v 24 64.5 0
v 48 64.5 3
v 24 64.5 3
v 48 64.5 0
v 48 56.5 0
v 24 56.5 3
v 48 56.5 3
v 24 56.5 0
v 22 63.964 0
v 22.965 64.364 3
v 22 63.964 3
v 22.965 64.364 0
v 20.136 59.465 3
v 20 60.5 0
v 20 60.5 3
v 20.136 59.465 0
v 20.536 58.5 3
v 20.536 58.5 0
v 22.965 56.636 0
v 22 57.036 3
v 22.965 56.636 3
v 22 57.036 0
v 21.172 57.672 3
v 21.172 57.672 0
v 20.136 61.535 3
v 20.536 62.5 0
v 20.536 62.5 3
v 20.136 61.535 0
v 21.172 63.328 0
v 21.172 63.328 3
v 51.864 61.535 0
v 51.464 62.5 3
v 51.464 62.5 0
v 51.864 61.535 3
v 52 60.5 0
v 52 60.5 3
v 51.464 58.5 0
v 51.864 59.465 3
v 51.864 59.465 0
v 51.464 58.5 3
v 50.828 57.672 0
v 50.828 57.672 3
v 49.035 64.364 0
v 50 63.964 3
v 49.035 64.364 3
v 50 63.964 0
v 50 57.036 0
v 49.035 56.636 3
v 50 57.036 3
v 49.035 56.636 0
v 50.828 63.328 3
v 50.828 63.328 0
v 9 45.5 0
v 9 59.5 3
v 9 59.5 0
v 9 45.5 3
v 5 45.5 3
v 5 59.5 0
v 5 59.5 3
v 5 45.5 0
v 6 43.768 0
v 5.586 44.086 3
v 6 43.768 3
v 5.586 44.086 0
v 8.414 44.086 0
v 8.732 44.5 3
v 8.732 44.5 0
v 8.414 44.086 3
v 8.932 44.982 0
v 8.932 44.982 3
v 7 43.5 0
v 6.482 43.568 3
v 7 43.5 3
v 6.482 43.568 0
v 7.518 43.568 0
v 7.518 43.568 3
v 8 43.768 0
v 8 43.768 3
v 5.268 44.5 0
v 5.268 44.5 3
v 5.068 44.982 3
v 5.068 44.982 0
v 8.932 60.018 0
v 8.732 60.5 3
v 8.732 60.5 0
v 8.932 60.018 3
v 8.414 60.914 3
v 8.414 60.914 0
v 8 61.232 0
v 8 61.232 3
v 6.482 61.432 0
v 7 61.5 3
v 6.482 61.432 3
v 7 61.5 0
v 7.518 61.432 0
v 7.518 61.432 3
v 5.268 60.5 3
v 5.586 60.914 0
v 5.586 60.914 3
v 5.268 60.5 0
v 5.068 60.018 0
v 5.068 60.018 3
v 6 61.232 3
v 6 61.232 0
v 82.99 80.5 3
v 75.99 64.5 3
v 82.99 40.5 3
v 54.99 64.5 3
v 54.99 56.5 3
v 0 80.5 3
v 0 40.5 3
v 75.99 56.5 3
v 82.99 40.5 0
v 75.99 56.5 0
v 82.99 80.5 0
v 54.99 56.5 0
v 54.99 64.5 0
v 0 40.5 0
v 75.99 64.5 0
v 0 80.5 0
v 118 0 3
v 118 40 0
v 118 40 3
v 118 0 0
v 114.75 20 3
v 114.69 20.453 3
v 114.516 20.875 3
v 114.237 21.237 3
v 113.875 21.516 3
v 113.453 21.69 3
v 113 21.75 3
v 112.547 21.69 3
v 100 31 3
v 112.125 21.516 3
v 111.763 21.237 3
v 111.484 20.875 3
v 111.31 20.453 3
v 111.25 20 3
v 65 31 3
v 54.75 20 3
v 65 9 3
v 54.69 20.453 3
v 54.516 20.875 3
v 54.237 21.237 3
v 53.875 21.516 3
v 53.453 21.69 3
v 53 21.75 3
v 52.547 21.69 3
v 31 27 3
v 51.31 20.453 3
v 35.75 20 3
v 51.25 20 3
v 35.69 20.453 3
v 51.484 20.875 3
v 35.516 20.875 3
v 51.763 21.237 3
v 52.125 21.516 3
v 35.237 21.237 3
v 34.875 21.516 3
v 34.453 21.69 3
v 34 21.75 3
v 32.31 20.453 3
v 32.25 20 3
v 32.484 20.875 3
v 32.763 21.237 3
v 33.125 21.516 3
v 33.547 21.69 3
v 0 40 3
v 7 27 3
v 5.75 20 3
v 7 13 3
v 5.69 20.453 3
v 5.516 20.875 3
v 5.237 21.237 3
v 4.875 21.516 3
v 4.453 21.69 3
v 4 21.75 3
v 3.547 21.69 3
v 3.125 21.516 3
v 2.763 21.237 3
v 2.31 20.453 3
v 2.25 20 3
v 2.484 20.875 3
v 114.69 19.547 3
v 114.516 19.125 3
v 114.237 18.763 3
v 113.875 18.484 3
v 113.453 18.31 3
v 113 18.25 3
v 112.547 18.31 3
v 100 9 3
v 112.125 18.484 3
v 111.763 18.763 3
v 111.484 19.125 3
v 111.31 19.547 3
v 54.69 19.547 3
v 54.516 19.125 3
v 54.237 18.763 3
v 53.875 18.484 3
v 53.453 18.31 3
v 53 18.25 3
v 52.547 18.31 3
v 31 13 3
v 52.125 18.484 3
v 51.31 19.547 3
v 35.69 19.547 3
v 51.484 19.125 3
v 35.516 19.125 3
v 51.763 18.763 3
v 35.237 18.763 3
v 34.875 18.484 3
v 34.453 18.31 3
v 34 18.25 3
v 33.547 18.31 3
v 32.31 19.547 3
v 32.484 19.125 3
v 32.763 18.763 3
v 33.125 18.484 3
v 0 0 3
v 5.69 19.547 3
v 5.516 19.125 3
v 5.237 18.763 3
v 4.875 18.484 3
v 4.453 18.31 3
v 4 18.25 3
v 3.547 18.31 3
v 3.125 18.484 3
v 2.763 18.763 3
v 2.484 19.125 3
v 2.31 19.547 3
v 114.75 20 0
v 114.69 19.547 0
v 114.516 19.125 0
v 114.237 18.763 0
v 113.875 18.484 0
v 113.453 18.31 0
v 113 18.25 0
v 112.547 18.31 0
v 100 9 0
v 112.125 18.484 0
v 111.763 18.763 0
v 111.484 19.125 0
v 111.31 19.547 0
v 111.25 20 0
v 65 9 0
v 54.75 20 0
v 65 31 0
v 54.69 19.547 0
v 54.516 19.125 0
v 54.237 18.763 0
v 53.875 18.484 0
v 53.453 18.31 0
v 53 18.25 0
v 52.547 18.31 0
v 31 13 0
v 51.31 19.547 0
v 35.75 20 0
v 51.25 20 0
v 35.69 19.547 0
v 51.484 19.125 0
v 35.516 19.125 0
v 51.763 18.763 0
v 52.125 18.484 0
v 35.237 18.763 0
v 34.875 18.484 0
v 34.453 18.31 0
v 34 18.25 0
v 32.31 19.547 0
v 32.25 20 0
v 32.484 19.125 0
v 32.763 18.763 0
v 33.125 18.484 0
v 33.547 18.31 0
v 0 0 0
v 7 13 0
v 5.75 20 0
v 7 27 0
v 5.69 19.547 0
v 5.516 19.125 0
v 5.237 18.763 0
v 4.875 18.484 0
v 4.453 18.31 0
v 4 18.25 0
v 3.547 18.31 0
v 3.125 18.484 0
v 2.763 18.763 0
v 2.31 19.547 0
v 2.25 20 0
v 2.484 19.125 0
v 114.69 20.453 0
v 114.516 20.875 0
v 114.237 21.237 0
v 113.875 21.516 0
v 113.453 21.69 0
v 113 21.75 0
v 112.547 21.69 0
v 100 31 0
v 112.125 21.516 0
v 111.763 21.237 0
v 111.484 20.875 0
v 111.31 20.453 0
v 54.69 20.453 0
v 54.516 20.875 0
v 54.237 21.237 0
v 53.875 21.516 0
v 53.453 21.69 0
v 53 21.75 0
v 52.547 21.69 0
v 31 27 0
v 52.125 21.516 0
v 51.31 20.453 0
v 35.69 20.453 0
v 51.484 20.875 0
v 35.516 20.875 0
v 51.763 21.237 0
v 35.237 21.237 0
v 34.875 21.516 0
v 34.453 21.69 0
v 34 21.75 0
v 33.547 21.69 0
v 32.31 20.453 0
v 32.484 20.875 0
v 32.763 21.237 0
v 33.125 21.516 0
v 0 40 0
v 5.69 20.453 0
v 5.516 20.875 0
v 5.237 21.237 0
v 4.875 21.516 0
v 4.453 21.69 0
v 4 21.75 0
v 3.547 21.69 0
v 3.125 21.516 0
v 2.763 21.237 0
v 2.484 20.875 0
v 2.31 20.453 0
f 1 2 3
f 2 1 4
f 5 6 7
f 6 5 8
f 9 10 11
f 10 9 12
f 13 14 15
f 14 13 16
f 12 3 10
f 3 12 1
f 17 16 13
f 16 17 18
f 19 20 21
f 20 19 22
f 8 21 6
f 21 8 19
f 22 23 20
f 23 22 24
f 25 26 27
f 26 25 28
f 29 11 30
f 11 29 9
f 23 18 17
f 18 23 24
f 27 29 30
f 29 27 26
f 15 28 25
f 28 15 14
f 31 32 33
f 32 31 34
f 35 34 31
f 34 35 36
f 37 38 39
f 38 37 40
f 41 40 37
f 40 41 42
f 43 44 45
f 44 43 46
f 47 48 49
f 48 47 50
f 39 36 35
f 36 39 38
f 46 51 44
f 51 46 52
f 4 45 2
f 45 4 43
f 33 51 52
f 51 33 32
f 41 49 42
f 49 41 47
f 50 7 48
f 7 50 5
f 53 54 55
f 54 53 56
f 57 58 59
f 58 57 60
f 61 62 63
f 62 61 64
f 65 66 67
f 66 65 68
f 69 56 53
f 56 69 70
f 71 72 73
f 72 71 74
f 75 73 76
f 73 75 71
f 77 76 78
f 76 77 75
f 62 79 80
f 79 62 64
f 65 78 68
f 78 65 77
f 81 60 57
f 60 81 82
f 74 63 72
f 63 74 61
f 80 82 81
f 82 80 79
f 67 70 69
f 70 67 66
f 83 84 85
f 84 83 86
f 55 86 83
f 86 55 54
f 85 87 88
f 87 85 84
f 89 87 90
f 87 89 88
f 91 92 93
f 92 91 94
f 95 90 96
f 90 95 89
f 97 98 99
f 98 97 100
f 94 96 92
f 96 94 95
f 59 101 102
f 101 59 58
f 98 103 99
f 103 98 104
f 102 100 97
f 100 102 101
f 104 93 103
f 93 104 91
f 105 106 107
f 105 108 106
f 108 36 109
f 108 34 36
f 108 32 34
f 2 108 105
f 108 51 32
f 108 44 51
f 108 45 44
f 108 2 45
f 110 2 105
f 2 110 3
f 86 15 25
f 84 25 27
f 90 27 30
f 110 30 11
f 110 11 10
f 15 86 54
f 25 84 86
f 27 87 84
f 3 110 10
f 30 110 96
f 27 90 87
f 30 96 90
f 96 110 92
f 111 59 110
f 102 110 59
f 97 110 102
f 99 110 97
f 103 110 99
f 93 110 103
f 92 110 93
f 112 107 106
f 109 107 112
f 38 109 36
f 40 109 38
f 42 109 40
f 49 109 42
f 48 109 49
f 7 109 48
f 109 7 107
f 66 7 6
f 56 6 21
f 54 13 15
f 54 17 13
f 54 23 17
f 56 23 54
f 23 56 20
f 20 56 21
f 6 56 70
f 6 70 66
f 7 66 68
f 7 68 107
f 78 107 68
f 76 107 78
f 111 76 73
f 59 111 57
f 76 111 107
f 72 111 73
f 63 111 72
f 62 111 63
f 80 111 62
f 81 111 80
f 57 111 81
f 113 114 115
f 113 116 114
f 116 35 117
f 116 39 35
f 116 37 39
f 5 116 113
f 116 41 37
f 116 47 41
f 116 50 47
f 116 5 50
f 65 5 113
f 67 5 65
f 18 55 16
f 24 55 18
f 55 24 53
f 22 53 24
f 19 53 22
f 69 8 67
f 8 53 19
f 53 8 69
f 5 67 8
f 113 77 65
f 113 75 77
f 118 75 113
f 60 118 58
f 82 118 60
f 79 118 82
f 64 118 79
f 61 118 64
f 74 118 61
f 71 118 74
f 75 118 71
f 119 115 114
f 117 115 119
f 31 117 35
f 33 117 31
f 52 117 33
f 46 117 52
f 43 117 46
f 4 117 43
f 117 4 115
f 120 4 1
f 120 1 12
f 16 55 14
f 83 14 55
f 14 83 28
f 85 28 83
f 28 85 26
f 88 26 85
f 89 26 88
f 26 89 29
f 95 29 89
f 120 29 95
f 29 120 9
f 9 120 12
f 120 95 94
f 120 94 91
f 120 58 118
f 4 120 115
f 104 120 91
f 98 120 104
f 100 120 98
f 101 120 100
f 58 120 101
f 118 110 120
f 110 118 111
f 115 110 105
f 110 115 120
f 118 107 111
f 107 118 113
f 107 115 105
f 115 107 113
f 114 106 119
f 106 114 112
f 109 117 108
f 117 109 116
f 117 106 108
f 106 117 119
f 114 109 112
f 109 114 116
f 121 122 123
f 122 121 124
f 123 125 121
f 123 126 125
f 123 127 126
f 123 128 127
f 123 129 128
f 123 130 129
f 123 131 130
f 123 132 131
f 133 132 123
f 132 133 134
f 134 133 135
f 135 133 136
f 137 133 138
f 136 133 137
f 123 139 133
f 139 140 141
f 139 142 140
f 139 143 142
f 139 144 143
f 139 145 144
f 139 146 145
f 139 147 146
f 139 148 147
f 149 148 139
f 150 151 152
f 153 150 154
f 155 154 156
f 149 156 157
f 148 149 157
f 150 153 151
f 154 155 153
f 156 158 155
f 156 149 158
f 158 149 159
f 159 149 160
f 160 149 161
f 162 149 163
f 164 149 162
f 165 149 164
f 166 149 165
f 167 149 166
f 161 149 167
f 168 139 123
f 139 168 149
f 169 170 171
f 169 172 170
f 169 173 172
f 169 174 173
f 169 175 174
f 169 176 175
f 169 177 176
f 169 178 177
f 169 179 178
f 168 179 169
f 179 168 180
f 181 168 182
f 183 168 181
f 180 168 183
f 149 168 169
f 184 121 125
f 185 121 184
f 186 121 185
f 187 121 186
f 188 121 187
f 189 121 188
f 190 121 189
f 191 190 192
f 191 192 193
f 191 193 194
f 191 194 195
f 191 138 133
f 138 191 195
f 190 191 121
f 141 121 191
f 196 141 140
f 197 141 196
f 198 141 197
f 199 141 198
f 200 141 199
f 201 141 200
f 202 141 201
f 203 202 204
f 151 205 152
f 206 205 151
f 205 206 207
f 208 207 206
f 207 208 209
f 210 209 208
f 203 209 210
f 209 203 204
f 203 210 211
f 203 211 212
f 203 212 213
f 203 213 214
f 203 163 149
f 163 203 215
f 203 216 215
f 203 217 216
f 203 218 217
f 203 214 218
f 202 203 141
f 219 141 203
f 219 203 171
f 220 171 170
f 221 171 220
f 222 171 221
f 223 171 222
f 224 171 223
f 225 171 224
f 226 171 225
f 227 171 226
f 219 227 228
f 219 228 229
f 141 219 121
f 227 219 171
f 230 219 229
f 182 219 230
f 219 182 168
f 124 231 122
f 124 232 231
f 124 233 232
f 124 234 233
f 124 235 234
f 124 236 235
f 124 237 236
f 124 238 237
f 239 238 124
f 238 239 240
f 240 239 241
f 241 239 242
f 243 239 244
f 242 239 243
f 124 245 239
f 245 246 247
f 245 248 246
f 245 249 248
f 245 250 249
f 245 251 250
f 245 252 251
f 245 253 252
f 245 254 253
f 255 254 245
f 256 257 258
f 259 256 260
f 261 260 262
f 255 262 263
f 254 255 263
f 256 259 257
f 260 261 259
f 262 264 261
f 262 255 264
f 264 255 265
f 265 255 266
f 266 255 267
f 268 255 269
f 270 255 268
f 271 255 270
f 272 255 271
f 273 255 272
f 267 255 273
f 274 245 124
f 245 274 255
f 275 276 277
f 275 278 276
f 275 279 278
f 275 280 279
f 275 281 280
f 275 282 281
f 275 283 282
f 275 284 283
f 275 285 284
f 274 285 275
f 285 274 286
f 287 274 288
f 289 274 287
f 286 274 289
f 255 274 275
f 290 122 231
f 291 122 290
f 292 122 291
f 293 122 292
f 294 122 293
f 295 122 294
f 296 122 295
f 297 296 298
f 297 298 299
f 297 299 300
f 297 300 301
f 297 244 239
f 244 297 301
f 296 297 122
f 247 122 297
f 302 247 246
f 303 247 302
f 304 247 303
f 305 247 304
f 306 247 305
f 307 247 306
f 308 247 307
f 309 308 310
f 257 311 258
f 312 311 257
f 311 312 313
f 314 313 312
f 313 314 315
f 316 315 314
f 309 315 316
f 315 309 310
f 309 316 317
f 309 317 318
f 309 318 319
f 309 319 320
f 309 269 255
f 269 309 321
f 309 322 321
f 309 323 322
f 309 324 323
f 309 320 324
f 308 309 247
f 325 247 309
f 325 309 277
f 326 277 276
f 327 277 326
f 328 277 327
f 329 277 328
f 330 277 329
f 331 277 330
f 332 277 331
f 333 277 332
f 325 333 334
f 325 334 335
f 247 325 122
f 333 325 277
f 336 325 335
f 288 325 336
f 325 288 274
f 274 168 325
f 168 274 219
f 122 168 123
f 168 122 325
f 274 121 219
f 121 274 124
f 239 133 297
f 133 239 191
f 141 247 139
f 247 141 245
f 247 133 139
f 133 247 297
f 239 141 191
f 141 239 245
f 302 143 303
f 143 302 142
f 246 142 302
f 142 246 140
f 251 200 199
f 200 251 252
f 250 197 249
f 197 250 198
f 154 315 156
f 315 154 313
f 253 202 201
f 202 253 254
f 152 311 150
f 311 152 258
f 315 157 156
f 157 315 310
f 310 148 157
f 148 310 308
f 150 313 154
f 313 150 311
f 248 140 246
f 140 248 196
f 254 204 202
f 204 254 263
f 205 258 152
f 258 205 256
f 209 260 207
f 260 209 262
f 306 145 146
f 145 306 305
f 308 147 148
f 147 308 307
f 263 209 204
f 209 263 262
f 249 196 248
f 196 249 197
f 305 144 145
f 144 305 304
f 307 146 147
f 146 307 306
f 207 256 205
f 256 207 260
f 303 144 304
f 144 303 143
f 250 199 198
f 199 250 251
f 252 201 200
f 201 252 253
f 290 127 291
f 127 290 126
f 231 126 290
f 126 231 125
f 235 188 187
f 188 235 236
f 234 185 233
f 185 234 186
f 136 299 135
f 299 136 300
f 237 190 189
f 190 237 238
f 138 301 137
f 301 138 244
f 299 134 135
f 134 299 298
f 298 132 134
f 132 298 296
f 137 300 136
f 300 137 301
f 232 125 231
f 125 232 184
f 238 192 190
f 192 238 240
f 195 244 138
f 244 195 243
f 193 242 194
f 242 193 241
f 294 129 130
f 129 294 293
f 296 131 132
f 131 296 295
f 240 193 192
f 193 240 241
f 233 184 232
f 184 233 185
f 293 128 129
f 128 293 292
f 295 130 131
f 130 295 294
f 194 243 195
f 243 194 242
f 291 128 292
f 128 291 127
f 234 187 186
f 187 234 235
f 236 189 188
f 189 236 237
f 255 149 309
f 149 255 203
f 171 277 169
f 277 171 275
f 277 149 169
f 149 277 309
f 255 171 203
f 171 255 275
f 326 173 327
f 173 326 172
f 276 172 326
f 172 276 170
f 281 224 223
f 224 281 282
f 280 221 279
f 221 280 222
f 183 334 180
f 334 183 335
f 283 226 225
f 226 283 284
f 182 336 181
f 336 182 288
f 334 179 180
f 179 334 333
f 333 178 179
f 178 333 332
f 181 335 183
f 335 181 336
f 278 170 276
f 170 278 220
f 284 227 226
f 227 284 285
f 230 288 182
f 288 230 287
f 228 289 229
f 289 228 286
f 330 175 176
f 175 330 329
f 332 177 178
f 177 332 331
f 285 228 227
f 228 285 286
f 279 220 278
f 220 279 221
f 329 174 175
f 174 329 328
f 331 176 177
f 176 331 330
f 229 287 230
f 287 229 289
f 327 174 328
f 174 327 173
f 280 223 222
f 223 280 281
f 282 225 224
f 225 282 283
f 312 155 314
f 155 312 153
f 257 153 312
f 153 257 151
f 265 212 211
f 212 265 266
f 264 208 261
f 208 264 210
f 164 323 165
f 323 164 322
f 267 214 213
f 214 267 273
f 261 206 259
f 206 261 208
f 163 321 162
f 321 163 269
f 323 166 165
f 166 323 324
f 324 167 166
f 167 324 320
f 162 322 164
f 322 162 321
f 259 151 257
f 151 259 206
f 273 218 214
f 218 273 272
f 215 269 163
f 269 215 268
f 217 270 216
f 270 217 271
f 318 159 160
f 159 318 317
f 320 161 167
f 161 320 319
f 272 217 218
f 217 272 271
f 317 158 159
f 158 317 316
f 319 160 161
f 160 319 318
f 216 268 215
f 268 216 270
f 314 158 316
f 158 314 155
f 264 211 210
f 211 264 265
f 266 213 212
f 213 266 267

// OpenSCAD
$fn=24;
THICKNESS=3;
SESW02_CHOP=31;
SESW02_CHOP_GAP=1.5;
SESW02_EXTEND=false;
HOLE_SIZE=3.5;
HOLE_R=HOLE_SIZE/2;
SESW01_SPLIT=false;

translate([0,40.5,0])
  sesw02_complete();

sesw01_complete();

/*
translate([10,91,0])
  20mm_spacers();

translate([70,16,0])
  8mm_spacers();
*/

module 20mm_spacers() {
  SPC = 20.5;
  20mm_spacer();
  translate([SPC,0,0])
    20mm_spacer();
  translate([SPC*2,0,0])
    20mm_spacer();
  translate([SPC*3,0,0])
    20mm_spacer();
}

module 20mm_spacer() {
  difference() {
    cylinder(r=10, h=THICKNESS);
    translate([0,0,-THICKNESS/2])
      cylinder(r=1.75, h=THICKNESS*2);
  }
}

module 8mm_spacers() {
  SPC = 8.5;  
  8mm_spacer();
  translate([0,SPC,0])
    8mm_spacer();
  translate([SPC,SPC,0])
    8mm_spacer();
  translate([SPC,0,0])
    8mm_spacer();
  translate([SPC*2,SPC,0])
    8mm_spacer();
  translate([SPC*2,0,0])
    8mm_spacer();
  translate([SPC*3,SPC,0])
    8mm_spacer();
  translate([SPC*3,0,0])
    8mm_spacer();
}

module 8mm_spacer() {
  difference() {
    cylinder(r=4, h=THICKNESS);
    translate([0,0,-THICKNESS/2])
      cylinder(r=HOLE_R, h=THICKNESS*2);
  }
}

module sesw01_complete() {
  if ( SESW01_SPLIT ) {
    sesw01_bottom();
    translate([41,0,0])
      sesw01_top();
  }
  else {
    difference() {
	  // Main body
      cube([118, 40, THICKNESS]);

	  // Switch access      
      translate([65,9,-THICKNESS/2])
        cube([35, 22, THICKNESS*2]);

      //Attachment to wall
      translate([53,20,-THICKNESS/2])
        cylinder(r=HOLE_R, h=THICKNESS*2);
      translate([113,20,-THICKNESS/2])
        cylinder(r=HOLE_R, h=THICKNESS*2);

	  //Servo holes
      translate([7,13,-THICKNESS/2])
        cube([24, 14, THICKNESS*2]);

      translate([4,20,-THICKNESS/2])
        cylinder(r=HOLE_R, h=THICKNESS*2);
      translate([34,20,-THICKNESS/2])
        cylinder(r=HOLE_R, h=THICKNESS*2);
    }
  }
}

module sesw01_top() {
  difference() {
    cube([82, 40, THICKNESS]);
    translate([28,9,-THICKNESS/2])
      cube([35, 22, THICKNESS*2]);
  }
}

module sesw01_bottom() {
  difference() {
    cube([40, 40, THICKNESS]);
    translate([8,13,-THICKNESS/2])
      cube([24, 14, THICKNESS*2]);
  }
}

module sesw02_complete() {
  sesw02_body();
  if (SESW02_EXTEND) {
    translate([12,45,0])
      sesw02_connectors();
  }
}

module sesw02_body() {
  if (SESW02_EXTEND) {
    translate([1,0,0])
      sesw02A();
    sesw02B();
  }
  else {
    union() {
      translate([-0.01,0,0])
        sesw02A();
      sesw02B();
    }
  }
}

module sesw02_connectors() {
  sesw02_connector();

  translate([0,10,0])
    sesw02_connector();
}

module sesw02_connector() {
  difference() {
    cube([63, 7, THICKNESS]);
    translate([58,3.5,-THICKNESS/2])
      cylinder(r=HOLE_R, h=THICKNESS*2);
    translate([48,3.5,-THICKNESS/2])
      cylinder(r=HOLE_R, h=THICKNESS*2);
    translate([10,3.5,-THICKNESS/2])
      cylinder(r=HOLE_R, h=THICKNESS*2);
    translate([5,3.5,-THICKNESS/2])
      cylinder(r=HOLE_R, h=THICKNESS*2);
  }
}

module sesw02B() {
  difference() {
    sesw02();
    translate([83-SESW02_CHOP+SESW02_CHOP_GAP,-2,-THICKNESS/2])
      cube([86, 44, THICKNESS*2]);
  }
}

module sesw02A() {
  difference() {
    sesw02();
    translate([-SESW02_CHOP-SESW02_CHOP_GAP,-2,-THICKNESS/2])
      cube([86, 44, THICKNESS*2]);
    if (SESW02_EXTEND) {
      translate([70,6.5,-THICKNESS/2])
        cylinder(r=HOLE_R, h=THICKNESS*2);
      translate([60,6.5,-THICKNESS/2])
        cylinder(r=HOLE_R, h=THICKNESS*2);
      translate([70,34,-THICKNESS/2])
        cylinder(r=HOLE_R, h=THICKNESS*2);
      translate([60,34,-THICKNESS/2])
        cylinder(r=HOLE_R, h=THICKNESS*2);
    }
  }
}

module sesw02() {
  difference() {
    cube([83, 40, THICKNESS]);
    translate([20,16,-THICKNESS/2])
      sesw02_slideA();
    translate([5,3,-THICKNESS/2])
      sesw02_slideB();
    if (SESW02_EXTEND) {
      translate([15,5,0])
        sesw02_slideC();
      translate([15,32.5,0])
        sesw02_slideC();
    }
    translate([55,16,-THICKNESS/2])
      sesw02_switch();
  }
}

module sesw02_slideA() {
  union() {
    translate([4,0,0])
      cube([24, 8, THICKNESS*2]);
    translate([4,4,0])
      cylinder(r=4, h=THICKNESS*2);
    translate([28,4,0])
      cylinder(r=4, h=THICKNESS*2);
  }
}

module sesw02_slideB() {
  union() {
    translate([0,2,0])
      cube([4, 14, THICKNESS*2]);
    translate([2,2,0])
      cylinder(r=2, h=THICKNESS*2);
    translate([2,16,0])
      cylinder(r=2, h=THICKNESS*2);
  }
}

module sesw02_slideC() {
  rotate([0,0,-90])
    translate([-3,0,-THICKNESS/2])
      union() {
        translate([0,1.5,0])
          cube([3, 29, THICKNESS*2]);
        translate([1.5,1.5,0])
          cylinder(r=1.5, h=THICKNESS*2);
        translate([1.5,31,0])
          cylinder(r=1.5, h=THICKNESS*2);
      }
}

module sesw02_switch() {
  cube([21, 8, THICKNESS*2]);
}
